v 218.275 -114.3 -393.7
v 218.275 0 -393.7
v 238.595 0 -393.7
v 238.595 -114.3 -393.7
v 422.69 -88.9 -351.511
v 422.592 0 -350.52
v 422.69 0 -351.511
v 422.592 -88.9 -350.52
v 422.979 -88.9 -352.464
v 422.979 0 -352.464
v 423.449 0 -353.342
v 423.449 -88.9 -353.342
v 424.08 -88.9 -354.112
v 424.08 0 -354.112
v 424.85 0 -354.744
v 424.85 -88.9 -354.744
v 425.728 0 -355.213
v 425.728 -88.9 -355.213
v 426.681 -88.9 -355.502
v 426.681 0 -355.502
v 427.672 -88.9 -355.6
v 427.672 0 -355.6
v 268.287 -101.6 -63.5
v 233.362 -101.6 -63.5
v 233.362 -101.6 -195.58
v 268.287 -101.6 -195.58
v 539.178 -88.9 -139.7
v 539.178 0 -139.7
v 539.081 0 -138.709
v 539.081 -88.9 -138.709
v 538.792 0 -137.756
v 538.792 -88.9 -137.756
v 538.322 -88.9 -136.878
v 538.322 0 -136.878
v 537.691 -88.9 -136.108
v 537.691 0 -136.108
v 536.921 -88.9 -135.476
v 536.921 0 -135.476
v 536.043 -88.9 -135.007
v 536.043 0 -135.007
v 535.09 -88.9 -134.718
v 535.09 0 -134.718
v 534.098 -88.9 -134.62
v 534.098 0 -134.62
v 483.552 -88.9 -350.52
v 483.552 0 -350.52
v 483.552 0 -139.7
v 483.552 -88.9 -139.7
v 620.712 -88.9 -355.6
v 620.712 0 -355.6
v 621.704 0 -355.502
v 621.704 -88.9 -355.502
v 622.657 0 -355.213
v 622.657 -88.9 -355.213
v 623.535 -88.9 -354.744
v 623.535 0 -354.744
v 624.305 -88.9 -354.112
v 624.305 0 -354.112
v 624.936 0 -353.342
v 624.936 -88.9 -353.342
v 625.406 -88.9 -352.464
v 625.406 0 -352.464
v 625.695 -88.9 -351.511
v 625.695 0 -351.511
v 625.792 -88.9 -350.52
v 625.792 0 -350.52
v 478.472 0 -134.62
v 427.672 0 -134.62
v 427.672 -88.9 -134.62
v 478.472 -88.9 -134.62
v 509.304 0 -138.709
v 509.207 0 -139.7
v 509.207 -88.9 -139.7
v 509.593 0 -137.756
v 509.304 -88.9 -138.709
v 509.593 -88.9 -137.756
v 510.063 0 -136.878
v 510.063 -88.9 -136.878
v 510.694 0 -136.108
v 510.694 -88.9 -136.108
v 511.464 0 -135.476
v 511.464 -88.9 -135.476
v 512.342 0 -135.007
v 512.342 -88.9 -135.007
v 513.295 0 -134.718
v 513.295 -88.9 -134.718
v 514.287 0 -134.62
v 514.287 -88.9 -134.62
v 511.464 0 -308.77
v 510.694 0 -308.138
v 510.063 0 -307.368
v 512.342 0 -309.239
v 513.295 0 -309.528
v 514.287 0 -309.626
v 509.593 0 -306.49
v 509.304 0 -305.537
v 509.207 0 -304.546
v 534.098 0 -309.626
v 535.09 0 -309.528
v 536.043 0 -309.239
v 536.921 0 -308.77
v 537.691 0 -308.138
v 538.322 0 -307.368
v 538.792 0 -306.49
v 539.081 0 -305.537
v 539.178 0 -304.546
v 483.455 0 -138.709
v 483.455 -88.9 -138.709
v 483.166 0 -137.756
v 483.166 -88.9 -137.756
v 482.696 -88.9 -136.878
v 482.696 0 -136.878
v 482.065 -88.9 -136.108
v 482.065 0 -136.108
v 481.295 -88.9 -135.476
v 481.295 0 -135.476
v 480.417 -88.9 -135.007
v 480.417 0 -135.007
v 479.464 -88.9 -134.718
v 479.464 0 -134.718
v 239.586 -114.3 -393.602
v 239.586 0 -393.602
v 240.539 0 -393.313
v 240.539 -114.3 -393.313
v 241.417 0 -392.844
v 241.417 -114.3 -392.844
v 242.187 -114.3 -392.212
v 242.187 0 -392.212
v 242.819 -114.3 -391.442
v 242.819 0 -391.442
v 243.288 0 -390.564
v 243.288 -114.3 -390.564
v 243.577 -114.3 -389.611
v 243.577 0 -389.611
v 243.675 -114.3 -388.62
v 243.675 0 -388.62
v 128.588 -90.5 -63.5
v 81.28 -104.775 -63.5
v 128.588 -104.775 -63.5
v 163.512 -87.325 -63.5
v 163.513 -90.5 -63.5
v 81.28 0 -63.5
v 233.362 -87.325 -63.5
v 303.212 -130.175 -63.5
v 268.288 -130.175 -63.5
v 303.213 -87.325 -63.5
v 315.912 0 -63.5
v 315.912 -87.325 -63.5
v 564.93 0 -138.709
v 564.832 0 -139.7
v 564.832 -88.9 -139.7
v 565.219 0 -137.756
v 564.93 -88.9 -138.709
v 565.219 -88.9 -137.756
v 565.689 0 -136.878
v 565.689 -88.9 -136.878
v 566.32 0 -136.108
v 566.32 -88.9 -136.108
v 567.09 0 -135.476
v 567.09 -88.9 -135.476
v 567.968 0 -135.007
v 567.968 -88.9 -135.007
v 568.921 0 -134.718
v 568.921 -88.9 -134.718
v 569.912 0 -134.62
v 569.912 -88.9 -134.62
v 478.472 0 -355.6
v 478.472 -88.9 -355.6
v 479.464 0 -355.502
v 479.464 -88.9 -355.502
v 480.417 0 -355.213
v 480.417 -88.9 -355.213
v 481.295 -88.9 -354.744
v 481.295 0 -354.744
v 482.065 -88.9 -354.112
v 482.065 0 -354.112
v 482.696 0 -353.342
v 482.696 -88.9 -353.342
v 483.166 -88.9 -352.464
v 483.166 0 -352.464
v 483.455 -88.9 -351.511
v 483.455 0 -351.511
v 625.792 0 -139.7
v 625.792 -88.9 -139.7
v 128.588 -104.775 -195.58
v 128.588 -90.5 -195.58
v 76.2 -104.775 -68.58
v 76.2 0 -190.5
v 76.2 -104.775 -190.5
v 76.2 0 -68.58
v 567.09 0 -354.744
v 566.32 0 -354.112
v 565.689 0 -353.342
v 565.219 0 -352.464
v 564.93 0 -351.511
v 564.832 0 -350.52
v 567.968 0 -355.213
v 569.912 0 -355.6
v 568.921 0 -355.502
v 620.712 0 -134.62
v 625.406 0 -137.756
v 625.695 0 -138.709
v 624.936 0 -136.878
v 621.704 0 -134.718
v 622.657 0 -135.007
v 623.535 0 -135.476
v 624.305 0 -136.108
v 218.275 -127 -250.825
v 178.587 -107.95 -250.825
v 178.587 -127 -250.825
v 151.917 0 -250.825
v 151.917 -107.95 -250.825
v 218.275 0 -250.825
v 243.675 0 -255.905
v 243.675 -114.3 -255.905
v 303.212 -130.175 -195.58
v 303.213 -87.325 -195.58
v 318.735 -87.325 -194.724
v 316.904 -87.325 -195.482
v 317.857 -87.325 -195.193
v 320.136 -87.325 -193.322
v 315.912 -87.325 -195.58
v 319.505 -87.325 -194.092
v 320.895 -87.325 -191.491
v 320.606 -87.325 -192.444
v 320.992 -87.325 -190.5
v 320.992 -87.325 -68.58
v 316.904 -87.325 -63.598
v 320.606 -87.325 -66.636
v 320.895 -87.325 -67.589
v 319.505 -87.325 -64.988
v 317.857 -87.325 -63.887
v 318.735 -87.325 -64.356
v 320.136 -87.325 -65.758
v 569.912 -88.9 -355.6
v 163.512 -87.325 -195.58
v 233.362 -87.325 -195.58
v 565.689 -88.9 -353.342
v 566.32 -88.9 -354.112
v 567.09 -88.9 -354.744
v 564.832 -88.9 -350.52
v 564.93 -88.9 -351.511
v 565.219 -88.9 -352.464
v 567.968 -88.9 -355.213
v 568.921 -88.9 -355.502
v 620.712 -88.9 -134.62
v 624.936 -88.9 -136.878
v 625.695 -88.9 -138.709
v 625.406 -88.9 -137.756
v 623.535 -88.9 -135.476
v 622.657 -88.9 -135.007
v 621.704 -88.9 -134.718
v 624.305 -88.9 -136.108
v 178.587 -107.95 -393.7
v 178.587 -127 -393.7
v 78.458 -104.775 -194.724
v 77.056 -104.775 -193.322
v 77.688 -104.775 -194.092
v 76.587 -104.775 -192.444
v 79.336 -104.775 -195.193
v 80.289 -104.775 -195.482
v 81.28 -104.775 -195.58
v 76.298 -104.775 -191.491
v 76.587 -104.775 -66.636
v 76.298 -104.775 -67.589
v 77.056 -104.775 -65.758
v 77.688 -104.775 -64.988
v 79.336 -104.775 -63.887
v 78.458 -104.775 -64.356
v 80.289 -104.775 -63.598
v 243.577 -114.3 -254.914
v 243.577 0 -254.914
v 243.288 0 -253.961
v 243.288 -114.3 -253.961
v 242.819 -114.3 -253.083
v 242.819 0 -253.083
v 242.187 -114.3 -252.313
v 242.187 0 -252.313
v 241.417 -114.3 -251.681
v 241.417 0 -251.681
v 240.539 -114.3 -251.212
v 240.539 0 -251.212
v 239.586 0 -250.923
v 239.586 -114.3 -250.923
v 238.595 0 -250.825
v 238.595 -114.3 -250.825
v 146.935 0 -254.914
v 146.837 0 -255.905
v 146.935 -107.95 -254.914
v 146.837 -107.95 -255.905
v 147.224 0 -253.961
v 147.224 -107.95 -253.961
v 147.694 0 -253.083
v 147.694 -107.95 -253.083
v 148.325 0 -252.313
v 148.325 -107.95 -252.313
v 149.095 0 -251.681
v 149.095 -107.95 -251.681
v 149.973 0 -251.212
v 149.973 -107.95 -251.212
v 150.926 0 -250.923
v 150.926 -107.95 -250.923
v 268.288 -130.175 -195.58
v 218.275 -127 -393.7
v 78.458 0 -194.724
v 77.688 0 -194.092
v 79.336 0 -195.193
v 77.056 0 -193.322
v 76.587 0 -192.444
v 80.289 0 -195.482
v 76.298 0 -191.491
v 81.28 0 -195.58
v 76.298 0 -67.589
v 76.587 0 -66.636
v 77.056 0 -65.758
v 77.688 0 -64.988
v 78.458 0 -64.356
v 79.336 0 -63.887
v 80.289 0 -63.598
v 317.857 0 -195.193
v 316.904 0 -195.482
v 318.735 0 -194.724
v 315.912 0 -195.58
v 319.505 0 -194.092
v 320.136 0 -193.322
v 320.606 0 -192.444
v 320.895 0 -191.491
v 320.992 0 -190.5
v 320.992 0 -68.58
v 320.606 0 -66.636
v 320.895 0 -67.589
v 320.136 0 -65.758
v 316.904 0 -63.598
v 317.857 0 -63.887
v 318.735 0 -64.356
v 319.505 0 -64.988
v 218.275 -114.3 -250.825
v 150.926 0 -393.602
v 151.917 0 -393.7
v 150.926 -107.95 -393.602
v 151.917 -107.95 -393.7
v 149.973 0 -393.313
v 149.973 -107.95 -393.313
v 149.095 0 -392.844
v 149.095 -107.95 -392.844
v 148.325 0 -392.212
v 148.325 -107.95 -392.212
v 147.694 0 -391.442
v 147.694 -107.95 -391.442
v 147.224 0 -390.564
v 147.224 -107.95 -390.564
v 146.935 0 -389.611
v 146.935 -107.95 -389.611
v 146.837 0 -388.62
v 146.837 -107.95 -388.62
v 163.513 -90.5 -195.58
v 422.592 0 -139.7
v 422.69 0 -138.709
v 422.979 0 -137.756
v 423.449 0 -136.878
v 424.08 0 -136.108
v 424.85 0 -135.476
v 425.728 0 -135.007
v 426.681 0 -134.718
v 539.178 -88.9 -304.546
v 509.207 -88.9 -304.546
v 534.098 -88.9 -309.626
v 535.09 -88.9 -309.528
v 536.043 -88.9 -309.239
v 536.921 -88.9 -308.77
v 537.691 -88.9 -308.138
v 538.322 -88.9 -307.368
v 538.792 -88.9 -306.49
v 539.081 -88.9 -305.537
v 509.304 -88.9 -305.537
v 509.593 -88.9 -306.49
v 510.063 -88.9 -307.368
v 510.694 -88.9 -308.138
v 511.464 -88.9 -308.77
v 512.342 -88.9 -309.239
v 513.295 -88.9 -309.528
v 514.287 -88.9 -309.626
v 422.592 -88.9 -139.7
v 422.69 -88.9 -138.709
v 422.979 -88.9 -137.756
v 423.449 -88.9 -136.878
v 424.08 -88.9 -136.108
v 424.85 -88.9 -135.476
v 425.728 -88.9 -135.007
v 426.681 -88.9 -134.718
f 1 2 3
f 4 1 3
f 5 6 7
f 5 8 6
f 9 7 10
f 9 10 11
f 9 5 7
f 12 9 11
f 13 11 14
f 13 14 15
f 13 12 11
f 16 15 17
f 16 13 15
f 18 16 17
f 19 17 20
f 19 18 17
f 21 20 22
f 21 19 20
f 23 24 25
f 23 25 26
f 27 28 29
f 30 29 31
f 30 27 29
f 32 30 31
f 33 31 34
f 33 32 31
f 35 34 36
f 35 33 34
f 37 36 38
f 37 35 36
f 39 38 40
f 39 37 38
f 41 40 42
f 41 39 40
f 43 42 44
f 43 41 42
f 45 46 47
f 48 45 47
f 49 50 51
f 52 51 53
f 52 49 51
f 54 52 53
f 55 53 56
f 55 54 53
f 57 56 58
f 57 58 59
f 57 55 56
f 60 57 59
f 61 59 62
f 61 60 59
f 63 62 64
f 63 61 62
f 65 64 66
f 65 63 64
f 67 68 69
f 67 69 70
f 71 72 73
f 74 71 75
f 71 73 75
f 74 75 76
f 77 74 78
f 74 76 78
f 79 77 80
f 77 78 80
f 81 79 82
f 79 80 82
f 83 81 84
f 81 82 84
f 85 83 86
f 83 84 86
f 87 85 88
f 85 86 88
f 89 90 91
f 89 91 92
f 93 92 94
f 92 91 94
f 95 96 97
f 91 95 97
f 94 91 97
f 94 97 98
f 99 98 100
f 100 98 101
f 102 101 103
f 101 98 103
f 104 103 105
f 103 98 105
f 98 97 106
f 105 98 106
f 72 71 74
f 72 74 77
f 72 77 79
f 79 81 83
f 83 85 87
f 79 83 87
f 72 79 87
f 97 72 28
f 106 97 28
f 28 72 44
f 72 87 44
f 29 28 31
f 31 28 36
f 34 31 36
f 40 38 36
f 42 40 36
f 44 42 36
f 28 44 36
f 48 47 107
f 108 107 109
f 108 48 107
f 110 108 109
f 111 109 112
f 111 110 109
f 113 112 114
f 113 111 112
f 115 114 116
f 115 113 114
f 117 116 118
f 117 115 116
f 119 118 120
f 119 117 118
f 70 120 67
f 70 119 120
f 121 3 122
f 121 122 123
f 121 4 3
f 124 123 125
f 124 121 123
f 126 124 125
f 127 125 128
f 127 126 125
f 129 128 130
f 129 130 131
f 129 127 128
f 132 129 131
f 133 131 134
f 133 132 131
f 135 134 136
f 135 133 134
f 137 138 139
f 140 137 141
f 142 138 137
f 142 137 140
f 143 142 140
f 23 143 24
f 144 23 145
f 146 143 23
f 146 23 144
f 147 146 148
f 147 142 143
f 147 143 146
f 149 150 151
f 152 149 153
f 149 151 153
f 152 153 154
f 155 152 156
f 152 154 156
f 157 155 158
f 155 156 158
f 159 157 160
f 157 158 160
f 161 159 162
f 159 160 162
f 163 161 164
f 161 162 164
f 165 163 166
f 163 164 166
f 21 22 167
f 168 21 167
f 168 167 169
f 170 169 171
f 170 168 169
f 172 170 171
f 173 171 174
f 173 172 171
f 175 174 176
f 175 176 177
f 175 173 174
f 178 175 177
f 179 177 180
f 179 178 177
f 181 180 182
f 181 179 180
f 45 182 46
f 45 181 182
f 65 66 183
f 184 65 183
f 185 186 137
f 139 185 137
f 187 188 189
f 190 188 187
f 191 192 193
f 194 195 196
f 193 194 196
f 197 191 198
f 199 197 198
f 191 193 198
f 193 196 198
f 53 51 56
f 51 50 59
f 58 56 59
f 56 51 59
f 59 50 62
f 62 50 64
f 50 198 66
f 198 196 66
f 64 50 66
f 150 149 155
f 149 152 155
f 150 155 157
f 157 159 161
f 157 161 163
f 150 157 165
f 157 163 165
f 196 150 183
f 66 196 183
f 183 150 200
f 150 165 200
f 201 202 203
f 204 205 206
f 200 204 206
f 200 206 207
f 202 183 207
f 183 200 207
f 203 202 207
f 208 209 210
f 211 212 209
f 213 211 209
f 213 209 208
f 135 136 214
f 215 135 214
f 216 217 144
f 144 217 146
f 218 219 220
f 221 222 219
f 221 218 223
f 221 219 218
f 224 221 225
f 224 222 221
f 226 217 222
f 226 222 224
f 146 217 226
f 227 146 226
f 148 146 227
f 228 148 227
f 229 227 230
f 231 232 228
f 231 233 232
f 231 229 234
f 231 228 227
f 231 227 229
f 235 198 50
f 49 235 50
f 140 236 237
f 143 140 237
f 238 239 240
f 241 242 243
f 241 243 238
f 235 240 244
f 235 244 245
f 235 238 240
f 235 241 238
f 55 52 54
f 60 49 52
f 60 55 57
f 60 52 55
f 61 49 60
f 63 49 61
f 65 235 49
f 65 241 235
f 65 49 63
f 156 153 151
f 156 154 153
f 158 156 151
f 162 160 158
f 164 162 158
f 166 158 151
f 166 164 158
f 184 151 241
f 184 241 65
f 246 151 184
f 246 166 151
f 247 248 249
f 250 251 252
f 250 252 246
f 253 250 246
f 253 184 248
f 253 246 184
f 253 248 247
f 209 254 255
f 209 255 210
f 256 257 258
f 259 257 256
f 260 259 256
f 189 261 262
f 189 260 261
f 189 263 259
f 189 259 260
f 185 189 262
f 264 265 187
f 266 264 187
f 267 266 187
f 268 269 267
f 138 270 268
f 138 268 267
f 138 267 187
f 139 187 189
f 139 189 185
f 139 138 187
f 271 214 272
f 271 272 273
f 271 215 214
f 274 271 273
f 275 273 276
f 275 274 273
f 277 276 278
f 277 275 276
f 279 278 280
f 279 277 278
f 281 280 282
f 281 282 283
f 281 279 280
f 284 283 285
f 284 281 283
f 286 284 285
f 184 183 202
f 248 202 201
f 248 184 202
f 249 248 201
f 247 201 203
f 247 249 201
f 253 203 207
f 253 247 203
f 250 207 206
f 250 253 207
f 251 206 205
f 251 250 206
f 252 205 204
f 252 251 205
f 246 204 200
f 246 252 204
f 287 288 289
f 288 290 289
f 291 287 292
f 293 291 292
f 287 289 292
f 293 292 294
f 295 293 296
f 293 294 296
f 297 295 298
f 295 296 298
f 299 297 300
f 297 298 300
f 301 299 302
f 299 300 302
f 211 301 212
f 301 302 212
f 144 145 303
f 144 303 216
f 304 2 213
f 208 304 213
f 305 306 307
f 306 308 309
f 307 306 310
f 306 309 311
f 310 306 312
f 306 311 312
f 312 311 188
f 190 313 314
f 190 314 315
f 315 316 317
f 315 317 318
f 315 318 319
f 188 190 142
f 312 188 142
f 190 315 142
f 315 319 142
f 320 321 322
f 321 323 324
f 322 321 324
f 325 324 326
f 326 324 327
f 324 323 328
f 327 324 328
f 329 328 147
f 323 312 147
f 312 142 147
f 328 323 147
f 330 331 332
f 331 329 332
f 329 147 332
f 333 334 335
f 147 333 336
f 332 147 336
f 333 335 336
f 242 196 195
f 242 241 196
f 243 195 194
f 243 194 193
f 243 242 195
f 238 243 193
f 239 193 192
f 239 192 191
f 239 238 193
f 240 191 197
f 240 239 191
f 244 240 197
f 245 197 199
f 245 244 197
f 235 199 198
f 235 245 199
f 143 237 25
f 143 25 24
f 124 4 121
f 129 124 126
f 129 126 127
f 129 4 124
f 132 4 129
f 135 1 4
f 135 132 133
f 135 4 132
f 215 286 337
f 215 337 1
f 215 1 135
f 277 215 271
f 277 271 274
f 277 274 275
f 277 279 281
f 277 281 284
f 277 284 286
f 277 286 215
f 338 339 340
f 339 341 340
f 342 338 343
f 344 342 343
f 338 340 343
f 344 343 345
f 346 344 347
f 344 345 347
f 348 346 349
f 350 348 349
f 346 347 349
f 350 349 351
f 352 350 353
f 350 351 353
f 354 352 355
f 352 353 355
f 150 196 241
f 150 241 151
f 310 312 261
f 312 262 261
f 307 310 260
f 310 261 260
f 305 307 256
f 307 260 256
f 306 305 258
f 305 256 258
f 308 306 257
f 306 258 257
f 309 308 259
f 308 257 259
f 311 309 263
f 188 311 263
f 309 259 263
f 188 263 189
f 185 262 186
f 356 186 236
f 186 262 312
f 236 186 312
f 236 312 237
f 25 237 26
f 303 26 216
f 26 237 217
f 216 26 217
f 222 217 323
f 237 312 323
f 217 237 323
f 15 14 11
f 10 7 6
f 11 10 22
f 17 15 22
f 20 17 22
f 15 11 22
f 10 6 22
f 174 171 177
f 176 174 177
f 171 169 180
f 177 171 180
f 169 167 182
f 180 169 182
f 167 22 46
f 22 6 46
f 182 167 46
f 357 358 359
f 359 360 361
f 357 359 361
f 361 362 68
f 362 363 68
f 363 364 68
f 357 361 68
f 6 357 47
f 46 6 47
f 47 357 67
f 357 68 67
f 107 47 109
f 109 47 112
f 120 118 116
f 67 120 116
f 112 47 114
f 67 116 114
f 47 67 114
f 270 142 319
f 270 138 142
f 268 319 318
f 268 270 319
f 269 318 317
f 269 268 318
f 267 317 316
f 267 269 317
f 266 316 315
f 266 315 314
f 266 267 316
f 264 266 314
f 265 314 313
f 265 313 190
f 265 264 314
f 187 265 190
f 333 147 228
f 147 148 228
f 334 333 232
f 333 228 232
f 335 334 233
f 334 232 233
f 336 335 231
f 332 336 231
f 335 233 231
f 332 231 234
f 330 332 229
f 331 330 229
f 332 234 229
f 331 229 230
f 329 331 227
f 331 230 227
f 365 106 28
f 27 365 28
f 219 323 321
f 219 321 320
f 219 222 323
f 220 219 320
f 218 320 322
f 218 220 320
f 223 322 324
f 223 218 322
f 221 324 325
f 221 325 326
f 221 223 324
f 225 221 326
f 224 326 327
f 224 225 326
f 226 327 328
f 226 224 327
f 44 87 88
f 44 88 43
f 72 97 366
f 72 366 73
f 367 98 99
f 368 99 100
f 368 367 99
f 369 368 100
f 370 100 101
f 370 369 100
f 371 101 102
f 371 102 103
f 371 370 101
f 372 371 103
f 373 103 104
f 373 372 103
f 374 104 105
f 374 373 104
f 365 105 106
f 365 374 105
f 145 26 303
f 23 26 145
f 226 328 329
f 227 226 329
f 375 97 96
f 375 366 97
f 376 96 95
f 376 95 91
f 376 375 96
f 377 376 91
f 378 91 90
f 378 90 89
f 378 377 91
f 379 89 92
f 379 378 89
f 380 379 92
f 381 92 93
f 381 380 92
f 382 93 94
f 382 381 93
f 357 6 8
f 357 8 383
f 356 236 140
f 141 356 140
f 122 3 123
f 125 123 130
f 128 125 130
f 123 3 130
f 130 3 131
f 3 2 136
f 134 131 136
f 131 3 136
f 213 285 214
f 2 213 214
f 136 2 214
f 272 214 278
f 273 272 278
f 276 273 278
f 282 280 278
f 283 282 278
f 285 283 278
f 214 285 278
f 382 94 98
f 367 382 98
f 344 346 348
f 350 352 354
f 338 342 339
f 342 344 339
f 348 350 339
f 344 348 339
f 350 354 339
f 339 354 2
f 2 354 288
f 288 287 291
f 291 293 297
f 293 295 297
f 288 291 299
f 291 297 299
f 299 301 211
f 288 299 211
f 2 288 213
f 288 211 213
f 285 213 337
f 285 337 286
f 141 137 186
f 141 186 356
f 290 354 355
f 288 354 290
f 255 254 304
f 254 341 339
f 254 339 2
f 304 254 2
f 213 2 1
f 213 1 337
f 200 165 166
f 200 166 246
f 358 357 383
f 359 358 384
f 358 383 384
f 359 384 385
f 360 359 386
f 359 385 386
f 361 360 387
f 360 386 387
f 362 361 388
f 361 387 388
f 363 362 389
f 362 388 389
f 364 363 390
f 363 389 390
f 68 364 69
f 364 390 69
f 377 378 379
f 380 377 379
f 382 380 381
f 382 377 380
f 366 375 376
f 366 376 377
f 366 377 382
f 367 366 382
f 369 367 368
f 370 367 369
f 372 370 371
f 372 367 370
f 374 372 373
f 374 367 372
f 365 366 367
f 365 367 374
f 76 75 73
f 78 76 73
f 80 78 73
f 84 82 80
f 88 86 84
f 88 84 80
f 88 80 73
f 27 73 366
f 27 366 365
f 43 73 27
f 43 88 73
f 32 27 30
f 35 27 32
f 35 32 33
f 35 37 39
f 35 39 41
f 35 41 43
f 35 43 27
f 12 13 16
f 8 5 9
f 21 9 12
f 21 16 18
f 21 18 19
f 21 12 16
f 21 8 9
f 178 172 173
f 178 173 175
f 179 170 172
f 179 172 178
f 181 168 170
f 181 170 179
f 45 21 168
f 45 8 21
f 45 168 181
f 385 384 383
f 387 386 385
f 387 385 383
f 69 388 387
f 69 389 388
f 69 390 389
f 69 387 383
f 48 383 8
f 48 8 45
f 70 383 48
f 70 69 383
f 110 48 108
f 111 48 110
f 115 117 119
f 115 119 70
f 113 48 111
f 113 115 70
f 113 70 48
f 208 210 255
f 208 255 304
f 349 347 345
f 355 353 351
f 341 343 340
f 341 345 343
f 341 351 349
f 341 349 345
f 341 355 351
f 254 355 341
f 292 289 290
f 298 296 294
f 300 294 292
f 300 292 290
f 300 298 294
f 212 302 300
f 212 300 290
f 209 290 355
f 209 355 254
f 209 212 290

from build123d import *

# Parameters (mm, degrees)
F0_W      = 60.96
F0_H      = 220.98
F1_DEPTH  = 88.9
F0_W_2    = 29.972
F0_H_2    = 175.006
F2_R      = 5.08
F2_2_R    = 5.08
F2_3_R    = 5.08
F3_R      = 5.08
F0_W_3    = 52.3875
F0_H_3    = 132.08
F4_DEPTH  = 104.775
F0_W_4    = 34.925
F5_DEPTH  = 90.5002
F0_W_5    = 69.85
F6_DEPTH  = 87.3252
F7_DEPTH  = 101.6
F8_DEPTH  = 130.175
F0_W_6    = 17.78
F9_DEPTH  = 87.3252
F0_W_7    = 31.75
F0_H_4    = 142.875
F10_DEPTH = 107.95
F0_W_8    = 39.6875
F11_DEPTH = 127
F0_W_9    = 25.4
F12_DEPTH = 114.3
F13_R     = 5.08
F13_2_R   = 5.08
F13_3_R   = 5.08


with BuildPart() as f1:
    # F0 (on Front) → F1 (new body)
    with BuildSketch(Plane.XZ):
        with Locations((453.0725, -245.11)):
            Rectangle(F0_W, F0_H)
    extrude(amount=F1_DEPTH)

    # F2
    f2_edges = [f1.edges().sort_by_distance(p)[0] for p in [
        (483.5525, -44.45, -134.62),
        (422.5925, -44.45, -134.62),
        (422.5925, -44.45, -355.6),
        (483.5525, -44.45, -355.6),
    ]]
    fillet(f2_edges, radius=F2_R)


with BuildPart() as f1b:
    # F0 (on Front) → F1, piece 2 (new body)
    with BuildSketch(Plane.XZ):
        with Locations((595.3125, -245.11)):
            Rectangle(F0_W, F0_H)
    extrude(amount=F1_DEPTH)

    # F2#2
    f2_2_edges = [f1b.edges().sort_by_distance(p)[0] for p in [
        (625.7925, -44.45, -134.62),
        (564.8325, -44.45, -134.62),
        (564.8325, -44.45, -355.6),
        (625.7925, -44.45, -355.6),
    ]]
    fillet(f2_2_edges, radius=F2_2_R)


with BuildPart() as f1c:
    # F0 (on Front) → F1, piece 3 (new body)
    with BuildSketch(Plane.XZ):
        with Locations((524.1925, -222.123)):
            Rectangle(F0_W_2, F0_H_2)
    extrude(amount=F1_DEPTH)

    # F2#3
    f2_3_edges = [f1c.edges().sort_by_distance(p)[0] for p in [
        (539.1785, -44.45, -134.62),
        (509.2065, -44.45, -309.626),
        (539.1785, -44.45, -309.626),
    ]]
    fillet(f2_3_edges, radius=F2_3_R)

    # F3
    f3_edges = [f1c.edges().sort_by_distance(p)[0] for p in [
        (509.2065, -44.45, -134.62),
    ]]
    fillet(f3_edges, radius=F3_R)


with BuildPart() as f4:
    # F0 (on Front) → F4 (new body)
    with BuildSketch(Plane.XZ):
        with Locations((102.39375, -129.54)):
            Rectangle(F0_W_3, F0_H_3)
    extrude(amount=F4_DEPTH)

    # F0 (on Front) → F5 (join)
    with BuildSketch(Plane.XZ):
        with Locations((146.05, -129.54)):
            Rectangle(F0_W_4, F0_H_3)
    extrude(amount=F5_DEPTH)

    # F0 (on Front) → F6 (join)
    with BuildSketch(Plane.XZ):
        with Locations((198.4375, -129.54)):
            Rectangle(F0_W_5, F0_H_3)
    extrude(amount=F6_DEPTH)

    # F0 (on Front) → F7 (join)
    with BuildSketch(Plane.XZ):
        with Locations((250.825, -129.54)):
            Rectangle(F0_W_4, F0_H_3)
    extrude(amount=F7_DEPTH)

    # F0 (on Front) → F8 (join)
    with BuildSketch(Plane.XZ):
        with Locations((285.75, -129.54)):
            Rectangle(F0_W_4, F0_H_3)
    extrude(amount=F8_DEPTH)

    # F0 (on Front) → F9 (join)
    with BuildSketch(Plane.XZ):
        with Locations((312.1025, -129.54)):
            Rectangle(F0_W_6, F0_H_3)
    extrude(amount=F9_DEPTH)

    # F13
    f13_edges = [f4.edges().sort_by_distance(p)[0] for p in [
        (320.9925, -43.6626, -63.5),
        (76.2, -52.3875, -63.5),
        (320.9925, -43.6626, -195.58),
        (76.2, -52.3875, -195.58),
    ]]
    fillet(f13_edges, radius=F13_R)


with BuildPart() as f10:
    # F0 (on Front) → F10 (new body)
    with BuildSketch(Plane.XZ):
        with Locations((162.7124, -322.2625)):
            Rectangle(F0_W_7, F0_H_4)
    extrude(amount=F10_DEPTH)

    # F0 (on Front) → F11 (join)
    with BuildSketch(Plane.XZ):
        with Locations((198.43115, -322.2625)):
            Rectangle(F0_W_8, F0_H_4)
    extrude(amount=F11_DEPTH)

    # F13#2
    f13_2_edges = [f10.edges().sort_by_distance(p)[0] for p in [
        (146.8374, -53.975, -250.825),
        (146.8374, -53.975, -393.7),
    ]]
    fillet(f13_2_edges, radius=F13_2_R)


with BuildPart() as f12:
    # F0 (on Front) → F12 (new body)
    with BuildSketch(Plane.XZ):
        with Locations((230.9749, -322.2625)):
            Rectangle(F0_W_9, F0_H_4)
    extrude(amount=F12_DEPTH)

    # F13#3
    f13_3_edges = [f12.edges().sort_by_distance(p)[0] for p in [
        (243.6749, -57.15, -250.825),
        (243.6749, -57.15, -393.7),
    ]]
    fillet(f13_3_edges, radius=F13_3_R)


solid = Compound([f1.part, f1b.part, f1c.part, f4.part, f10.part, f12.part])
